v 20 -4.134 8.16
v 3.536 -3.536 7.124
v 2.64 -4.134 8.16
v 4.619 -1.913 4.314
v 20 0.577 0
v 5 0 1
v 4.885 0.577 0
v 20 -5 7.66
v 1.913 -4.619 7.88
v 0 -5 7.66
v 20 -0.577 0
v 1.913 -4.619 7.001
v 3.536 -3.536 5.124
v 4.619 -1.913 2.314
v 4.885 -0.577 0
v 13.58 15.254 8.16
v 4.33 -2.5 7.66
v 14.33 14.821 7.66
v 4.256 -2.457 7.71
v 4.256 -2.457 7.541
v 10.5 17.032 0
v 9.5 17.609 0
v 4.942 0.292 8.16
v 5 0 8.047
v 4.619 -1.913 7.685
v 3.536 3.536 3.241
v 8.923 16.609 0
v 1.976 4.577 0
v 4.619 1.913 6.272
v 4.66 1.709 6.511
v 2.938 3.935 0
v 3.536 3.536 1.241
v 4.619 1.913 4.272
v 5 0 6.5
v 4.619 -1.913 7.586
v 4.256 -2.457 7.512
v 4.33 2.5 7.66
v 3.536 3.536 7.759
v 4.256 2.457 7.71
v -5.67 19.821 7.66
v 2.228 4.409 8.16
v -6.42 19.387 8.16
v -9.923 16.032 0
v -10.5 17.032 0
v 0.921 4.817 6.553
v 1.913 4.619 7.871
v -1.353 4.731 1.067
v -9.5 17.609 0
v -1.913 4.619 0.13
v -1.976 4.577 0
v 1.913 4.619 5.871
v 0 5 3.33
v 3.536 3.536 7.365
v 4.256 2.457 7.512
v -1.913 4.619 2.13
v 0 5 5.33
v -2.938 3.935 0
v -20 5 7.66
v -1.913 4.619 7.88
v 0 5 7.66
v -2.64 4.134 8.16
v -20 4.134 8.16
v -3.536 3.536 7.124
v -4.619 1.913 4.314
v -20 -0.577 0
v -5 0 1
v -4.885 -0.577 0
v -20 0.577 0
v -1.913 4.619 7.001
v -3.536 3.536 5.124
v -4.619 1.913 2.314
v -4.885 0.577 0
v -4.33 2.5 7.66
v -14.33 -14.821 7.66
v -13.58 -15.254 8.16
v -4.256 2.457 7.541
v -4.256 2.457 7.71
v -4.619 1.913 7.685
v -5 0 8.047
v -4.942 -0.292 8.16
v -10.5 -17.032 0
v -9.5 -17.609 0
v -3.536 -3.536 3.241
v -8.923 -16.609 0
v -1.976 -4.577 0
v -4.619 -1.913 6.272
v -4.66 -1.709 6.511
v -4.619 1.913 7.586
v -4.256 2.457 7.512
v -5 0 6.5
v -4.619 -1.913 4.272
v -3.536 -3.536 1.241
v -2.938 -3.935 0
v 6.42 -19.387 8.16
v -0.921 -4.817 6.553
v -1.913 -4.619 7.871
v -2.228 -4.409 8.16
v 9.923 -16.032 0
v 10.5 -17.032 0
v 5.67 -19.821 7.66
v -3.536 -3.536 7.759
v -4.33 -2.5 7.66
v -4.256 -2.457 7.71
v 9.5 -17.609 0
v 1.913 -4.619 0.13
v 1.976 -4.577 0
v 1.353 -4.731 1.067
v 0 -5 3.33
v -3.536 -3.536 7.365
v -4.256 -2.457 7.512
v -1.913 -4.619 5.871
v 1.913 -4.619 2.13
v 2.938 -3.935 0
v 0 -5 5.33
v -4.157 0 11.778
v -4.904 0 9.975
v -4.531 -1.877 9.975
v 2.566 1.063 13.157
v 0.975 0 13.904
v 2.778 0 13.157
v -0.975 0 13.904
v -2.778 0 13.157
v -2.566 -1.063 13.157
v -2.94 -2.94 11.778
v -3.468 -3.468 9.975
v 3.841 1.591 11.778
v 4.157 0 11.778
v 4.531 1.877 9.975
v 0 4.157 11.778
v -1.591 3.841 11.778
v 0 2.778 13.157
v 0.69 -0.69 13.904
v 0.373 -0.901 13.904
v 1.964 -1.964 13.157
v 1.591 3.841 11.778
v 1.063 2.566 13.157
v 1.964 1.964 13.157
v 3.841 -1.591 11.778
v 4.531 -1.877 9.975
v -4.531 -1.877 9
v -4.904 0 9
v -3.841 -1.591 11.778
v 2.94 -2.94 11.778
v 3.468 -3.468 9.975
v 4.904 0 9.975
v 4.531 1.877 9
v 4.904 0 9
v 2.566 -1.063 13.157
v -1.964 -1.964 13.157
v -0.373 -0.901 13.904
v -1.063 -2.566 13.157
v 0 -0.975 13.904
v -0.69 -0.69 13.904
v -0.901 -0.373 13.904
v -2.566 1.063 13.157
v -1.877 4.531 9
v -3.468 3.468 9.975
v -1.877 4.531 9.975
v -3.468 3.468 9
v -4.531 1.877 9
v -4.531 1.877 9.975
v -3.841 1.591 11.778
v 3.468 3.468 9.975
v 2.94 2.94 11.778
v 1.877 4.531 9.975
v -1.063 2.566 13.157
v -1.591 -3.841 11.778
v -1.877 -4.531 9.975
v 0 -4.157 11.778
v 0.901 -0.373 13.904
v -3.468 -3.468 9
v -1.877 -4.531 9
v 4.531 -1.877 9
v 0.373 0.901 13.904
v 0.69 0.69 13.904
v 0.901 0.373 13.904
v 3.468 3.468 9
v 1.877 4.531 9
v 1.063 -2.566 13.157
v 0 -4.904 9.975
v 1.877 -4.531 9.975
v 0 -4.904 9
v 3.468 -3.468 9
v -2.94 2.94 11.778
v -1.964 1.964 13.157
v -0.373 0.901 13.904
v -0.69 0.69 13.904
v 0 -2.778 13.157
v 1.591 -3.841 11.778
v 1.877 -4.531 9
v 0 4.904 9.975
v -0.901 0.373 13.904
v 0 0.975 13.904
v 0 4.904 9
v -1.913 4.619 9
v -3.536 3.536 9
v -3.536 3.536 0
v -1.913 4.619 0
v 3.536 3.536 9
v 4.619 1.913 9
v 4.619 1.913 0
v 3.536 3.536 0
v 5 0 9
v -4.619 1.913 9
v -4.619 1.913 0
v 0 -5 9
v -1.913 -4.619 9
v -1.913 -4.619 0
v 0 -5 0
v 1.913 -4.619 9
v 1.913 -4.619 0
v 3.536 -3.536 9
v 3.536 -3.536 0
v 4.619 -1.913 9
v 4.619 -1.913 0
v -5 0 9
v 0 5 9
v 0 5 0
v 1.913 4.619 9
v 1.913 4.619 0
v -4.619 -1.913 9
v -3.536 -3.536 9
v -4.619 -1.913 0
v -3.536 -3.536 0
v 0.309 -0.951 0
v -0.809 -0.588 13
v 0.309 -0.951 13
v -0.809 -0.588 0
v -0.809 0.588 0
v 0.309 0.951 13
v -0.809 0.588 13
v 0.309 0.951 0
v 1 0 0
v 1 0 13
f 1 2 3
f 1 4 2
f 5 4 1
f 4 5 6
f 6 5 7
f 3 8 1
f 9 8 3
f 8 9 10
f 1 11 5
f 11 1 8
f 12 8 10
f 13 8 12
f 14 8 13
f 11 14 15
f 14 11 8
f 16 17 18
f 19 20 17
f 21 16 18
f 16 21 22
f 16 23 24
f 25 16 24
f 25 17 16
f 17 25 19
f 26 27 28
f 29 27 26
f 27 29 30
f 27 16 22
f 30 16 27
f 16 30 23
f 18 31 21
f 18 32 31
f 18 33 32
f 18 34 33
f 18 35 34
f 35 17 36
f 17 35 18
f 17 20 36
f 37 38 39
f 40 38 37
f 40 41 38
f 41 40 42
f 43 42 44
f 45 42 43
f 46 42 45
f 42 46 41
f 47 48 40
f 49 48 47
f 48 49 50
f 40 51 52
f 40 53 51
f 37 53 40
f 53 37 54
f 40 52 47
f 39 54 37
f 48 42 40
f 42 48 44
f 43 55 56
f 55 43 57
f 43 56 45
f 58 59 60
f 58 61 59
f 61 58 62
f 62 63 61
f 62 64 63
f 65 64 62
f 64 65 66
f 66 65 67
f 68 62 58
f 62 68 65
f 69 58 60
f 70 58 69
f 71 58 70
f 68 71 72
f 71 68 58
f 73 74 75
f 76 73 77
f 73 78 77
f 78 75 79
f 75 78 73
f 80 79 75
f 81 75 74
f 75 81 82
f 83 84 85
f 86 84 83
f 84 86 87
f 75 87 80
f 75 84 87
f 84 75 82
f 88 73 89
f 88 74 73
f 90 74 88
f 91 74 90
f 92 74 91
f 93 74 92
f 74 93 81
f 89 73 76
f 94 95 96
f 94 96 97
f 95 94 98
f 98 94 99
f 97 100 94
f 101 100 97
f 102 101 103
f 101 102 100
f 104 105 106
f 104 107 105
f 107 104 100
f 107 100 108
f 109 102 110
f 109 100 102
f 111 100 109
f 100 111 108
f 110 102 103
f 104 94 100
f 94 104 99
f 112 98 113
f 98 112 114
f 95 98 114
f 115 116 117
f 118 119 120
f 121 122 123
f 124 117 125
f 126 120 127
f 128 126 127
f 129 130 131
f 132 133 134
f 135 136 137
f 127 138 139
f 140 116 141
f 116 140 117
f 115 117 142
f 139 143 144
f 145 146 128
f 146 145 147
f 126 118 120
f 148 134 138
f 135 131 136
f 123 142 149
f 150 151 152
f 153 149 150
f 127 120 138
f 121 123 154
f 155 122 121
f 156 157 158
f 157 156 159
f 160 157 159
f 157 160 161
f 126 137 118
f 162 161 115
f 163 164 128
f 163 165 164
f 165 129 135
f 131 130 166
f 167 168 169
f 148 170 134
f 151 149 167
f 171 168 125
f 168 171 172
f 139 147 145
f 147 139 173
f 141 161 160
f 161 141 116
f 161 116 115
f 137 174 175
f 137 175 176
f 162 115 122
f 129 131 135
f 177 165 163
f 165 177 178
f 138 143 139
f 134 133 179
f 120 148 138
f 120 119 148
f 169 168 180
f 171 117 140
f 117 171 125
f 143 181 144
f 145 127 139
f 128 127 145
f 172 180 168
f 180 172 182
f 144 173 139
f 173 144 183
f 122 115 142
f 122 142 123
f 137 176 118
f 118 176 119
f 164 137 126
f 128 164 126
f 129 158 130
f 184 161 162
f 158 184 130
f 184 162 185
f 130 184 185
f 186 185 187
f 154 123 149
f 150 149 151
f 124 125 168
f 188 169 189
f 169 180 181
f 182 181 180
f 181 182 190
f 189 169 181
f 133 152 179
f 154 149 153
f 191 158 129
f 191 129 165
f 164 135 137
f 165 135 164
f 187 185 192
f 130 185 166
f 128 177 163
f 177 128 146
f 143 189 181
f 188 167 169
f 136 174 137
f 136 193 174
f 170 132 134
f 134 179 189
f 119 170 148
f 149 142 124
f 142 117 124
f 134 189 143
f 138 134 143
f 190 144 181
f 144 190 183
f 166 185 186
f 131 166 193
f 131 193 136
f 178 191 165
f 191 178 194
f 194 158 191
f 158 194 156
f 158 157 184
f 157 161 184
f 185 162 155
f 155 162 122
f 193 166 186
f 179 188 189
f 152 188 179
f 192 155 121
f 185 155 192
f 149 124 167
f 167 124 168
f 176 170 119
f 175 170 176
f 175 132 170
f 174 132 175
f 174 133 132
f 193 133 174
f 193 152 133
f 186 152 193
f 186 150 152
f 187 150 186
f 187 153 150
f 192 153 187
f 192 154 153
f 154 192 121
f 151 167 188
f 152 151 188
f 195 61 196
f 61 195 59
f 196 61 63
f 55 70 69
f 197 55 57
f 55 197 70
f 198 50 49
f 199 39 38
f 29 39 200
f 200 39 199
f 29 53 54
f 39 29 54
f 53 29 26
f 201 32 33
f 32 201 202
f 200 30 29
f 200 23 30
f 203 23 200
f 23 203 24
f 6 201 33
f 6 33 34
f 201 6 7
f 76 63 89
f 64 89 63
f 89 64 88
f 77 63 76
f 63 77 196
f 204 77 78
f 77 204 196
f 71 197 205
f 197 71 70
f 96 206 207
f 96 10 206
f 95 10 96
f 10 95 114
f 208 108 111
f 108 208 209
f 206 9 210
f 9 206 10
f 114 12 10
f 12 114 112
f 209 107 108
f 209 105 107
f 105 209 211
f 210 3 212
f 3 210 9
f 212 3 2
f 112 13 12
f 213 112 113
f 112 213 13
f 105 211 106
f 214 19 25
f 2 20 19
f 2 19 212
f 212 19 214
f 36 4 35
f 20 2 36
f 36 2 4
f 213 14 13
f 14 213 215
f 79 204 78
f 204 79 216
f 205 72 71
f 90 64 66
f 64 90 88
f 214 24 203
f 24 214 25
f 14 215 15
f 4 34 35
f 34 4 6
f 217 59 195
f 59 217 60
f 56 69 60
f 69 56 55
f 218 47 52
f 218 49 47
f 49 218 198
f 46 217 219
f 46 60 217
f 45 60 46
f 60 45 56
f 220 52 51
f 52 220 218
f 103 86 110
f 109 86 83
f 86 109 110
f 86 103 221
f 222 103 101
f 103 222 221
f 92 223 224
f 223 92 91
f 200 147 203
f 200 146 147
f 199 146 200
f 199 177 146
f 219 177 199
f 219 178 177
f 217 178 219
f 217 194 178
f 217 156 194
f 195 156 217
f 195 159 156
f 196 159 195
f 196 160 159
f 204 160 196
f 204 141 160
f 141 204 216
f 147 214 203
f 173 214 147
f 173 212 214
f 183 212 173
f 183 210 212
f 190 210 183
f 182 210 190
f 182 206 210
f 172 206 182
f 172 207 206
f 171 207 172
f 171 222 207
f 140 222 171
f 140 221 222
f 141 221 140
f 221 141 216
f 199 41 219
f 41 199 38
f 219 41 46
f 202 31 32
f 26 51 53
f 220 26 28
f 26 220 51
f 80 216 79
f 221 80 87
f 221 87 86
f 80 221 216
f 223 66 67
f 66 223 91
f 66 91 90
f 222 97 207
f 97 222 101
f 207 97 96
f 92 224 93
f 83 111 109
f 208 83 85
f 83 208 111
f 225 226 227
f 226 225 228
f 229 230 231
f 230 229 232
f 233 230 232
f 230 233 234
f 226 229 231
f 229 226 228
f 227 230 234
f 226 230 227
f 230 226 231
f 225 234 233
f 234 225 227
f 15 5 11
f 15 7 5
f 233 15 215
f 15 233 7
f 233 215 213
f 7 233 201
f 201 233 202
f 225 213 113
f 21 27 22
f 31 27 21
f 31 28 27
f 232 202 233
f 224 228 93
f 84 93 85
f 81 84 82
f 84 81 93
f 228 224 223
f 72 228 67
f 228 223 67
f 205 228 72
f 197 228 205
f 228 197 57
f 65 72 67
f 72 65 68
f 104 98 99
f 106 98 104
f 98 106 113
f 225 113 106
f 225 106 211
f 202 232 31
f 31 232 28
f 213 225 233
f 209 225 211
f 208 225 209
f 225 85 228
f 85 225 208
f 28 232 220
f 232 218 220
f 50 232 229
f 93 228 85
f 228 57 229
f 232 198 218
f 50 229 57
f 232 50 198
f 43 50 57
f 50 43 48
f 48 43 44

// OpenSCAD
hd = 10;	// hub diameter (should be function of blade angle
ms = 2;	// motor shaft diameter
bl = 20;	// blade length
ba = 30;	// blade angle

// make sure base is at 0
translate([0,0,-1]){

	difference(){

		union(){

			// nose
			translate([0,0,10]){
				sphere(r=(hd/2));
			}

			// hub
			cylinder(r=(hd/2), h=10);

			// blades
			for(i=[0:5]){
				rotate([0,0,i * (360 / 6)]){
					rotate([ba,0,0]){
						cube([bl,1,10]);
					}
				}
			}
		}

		// motor shaft hole	
		translate([0,0,-1]){
			cylinder(r=(ms/2), h=15);
		}

		// flat bottom
		translate([0,0,-1]){
			cylinder(r=(bl*2), h=2);
		}
	}
}
